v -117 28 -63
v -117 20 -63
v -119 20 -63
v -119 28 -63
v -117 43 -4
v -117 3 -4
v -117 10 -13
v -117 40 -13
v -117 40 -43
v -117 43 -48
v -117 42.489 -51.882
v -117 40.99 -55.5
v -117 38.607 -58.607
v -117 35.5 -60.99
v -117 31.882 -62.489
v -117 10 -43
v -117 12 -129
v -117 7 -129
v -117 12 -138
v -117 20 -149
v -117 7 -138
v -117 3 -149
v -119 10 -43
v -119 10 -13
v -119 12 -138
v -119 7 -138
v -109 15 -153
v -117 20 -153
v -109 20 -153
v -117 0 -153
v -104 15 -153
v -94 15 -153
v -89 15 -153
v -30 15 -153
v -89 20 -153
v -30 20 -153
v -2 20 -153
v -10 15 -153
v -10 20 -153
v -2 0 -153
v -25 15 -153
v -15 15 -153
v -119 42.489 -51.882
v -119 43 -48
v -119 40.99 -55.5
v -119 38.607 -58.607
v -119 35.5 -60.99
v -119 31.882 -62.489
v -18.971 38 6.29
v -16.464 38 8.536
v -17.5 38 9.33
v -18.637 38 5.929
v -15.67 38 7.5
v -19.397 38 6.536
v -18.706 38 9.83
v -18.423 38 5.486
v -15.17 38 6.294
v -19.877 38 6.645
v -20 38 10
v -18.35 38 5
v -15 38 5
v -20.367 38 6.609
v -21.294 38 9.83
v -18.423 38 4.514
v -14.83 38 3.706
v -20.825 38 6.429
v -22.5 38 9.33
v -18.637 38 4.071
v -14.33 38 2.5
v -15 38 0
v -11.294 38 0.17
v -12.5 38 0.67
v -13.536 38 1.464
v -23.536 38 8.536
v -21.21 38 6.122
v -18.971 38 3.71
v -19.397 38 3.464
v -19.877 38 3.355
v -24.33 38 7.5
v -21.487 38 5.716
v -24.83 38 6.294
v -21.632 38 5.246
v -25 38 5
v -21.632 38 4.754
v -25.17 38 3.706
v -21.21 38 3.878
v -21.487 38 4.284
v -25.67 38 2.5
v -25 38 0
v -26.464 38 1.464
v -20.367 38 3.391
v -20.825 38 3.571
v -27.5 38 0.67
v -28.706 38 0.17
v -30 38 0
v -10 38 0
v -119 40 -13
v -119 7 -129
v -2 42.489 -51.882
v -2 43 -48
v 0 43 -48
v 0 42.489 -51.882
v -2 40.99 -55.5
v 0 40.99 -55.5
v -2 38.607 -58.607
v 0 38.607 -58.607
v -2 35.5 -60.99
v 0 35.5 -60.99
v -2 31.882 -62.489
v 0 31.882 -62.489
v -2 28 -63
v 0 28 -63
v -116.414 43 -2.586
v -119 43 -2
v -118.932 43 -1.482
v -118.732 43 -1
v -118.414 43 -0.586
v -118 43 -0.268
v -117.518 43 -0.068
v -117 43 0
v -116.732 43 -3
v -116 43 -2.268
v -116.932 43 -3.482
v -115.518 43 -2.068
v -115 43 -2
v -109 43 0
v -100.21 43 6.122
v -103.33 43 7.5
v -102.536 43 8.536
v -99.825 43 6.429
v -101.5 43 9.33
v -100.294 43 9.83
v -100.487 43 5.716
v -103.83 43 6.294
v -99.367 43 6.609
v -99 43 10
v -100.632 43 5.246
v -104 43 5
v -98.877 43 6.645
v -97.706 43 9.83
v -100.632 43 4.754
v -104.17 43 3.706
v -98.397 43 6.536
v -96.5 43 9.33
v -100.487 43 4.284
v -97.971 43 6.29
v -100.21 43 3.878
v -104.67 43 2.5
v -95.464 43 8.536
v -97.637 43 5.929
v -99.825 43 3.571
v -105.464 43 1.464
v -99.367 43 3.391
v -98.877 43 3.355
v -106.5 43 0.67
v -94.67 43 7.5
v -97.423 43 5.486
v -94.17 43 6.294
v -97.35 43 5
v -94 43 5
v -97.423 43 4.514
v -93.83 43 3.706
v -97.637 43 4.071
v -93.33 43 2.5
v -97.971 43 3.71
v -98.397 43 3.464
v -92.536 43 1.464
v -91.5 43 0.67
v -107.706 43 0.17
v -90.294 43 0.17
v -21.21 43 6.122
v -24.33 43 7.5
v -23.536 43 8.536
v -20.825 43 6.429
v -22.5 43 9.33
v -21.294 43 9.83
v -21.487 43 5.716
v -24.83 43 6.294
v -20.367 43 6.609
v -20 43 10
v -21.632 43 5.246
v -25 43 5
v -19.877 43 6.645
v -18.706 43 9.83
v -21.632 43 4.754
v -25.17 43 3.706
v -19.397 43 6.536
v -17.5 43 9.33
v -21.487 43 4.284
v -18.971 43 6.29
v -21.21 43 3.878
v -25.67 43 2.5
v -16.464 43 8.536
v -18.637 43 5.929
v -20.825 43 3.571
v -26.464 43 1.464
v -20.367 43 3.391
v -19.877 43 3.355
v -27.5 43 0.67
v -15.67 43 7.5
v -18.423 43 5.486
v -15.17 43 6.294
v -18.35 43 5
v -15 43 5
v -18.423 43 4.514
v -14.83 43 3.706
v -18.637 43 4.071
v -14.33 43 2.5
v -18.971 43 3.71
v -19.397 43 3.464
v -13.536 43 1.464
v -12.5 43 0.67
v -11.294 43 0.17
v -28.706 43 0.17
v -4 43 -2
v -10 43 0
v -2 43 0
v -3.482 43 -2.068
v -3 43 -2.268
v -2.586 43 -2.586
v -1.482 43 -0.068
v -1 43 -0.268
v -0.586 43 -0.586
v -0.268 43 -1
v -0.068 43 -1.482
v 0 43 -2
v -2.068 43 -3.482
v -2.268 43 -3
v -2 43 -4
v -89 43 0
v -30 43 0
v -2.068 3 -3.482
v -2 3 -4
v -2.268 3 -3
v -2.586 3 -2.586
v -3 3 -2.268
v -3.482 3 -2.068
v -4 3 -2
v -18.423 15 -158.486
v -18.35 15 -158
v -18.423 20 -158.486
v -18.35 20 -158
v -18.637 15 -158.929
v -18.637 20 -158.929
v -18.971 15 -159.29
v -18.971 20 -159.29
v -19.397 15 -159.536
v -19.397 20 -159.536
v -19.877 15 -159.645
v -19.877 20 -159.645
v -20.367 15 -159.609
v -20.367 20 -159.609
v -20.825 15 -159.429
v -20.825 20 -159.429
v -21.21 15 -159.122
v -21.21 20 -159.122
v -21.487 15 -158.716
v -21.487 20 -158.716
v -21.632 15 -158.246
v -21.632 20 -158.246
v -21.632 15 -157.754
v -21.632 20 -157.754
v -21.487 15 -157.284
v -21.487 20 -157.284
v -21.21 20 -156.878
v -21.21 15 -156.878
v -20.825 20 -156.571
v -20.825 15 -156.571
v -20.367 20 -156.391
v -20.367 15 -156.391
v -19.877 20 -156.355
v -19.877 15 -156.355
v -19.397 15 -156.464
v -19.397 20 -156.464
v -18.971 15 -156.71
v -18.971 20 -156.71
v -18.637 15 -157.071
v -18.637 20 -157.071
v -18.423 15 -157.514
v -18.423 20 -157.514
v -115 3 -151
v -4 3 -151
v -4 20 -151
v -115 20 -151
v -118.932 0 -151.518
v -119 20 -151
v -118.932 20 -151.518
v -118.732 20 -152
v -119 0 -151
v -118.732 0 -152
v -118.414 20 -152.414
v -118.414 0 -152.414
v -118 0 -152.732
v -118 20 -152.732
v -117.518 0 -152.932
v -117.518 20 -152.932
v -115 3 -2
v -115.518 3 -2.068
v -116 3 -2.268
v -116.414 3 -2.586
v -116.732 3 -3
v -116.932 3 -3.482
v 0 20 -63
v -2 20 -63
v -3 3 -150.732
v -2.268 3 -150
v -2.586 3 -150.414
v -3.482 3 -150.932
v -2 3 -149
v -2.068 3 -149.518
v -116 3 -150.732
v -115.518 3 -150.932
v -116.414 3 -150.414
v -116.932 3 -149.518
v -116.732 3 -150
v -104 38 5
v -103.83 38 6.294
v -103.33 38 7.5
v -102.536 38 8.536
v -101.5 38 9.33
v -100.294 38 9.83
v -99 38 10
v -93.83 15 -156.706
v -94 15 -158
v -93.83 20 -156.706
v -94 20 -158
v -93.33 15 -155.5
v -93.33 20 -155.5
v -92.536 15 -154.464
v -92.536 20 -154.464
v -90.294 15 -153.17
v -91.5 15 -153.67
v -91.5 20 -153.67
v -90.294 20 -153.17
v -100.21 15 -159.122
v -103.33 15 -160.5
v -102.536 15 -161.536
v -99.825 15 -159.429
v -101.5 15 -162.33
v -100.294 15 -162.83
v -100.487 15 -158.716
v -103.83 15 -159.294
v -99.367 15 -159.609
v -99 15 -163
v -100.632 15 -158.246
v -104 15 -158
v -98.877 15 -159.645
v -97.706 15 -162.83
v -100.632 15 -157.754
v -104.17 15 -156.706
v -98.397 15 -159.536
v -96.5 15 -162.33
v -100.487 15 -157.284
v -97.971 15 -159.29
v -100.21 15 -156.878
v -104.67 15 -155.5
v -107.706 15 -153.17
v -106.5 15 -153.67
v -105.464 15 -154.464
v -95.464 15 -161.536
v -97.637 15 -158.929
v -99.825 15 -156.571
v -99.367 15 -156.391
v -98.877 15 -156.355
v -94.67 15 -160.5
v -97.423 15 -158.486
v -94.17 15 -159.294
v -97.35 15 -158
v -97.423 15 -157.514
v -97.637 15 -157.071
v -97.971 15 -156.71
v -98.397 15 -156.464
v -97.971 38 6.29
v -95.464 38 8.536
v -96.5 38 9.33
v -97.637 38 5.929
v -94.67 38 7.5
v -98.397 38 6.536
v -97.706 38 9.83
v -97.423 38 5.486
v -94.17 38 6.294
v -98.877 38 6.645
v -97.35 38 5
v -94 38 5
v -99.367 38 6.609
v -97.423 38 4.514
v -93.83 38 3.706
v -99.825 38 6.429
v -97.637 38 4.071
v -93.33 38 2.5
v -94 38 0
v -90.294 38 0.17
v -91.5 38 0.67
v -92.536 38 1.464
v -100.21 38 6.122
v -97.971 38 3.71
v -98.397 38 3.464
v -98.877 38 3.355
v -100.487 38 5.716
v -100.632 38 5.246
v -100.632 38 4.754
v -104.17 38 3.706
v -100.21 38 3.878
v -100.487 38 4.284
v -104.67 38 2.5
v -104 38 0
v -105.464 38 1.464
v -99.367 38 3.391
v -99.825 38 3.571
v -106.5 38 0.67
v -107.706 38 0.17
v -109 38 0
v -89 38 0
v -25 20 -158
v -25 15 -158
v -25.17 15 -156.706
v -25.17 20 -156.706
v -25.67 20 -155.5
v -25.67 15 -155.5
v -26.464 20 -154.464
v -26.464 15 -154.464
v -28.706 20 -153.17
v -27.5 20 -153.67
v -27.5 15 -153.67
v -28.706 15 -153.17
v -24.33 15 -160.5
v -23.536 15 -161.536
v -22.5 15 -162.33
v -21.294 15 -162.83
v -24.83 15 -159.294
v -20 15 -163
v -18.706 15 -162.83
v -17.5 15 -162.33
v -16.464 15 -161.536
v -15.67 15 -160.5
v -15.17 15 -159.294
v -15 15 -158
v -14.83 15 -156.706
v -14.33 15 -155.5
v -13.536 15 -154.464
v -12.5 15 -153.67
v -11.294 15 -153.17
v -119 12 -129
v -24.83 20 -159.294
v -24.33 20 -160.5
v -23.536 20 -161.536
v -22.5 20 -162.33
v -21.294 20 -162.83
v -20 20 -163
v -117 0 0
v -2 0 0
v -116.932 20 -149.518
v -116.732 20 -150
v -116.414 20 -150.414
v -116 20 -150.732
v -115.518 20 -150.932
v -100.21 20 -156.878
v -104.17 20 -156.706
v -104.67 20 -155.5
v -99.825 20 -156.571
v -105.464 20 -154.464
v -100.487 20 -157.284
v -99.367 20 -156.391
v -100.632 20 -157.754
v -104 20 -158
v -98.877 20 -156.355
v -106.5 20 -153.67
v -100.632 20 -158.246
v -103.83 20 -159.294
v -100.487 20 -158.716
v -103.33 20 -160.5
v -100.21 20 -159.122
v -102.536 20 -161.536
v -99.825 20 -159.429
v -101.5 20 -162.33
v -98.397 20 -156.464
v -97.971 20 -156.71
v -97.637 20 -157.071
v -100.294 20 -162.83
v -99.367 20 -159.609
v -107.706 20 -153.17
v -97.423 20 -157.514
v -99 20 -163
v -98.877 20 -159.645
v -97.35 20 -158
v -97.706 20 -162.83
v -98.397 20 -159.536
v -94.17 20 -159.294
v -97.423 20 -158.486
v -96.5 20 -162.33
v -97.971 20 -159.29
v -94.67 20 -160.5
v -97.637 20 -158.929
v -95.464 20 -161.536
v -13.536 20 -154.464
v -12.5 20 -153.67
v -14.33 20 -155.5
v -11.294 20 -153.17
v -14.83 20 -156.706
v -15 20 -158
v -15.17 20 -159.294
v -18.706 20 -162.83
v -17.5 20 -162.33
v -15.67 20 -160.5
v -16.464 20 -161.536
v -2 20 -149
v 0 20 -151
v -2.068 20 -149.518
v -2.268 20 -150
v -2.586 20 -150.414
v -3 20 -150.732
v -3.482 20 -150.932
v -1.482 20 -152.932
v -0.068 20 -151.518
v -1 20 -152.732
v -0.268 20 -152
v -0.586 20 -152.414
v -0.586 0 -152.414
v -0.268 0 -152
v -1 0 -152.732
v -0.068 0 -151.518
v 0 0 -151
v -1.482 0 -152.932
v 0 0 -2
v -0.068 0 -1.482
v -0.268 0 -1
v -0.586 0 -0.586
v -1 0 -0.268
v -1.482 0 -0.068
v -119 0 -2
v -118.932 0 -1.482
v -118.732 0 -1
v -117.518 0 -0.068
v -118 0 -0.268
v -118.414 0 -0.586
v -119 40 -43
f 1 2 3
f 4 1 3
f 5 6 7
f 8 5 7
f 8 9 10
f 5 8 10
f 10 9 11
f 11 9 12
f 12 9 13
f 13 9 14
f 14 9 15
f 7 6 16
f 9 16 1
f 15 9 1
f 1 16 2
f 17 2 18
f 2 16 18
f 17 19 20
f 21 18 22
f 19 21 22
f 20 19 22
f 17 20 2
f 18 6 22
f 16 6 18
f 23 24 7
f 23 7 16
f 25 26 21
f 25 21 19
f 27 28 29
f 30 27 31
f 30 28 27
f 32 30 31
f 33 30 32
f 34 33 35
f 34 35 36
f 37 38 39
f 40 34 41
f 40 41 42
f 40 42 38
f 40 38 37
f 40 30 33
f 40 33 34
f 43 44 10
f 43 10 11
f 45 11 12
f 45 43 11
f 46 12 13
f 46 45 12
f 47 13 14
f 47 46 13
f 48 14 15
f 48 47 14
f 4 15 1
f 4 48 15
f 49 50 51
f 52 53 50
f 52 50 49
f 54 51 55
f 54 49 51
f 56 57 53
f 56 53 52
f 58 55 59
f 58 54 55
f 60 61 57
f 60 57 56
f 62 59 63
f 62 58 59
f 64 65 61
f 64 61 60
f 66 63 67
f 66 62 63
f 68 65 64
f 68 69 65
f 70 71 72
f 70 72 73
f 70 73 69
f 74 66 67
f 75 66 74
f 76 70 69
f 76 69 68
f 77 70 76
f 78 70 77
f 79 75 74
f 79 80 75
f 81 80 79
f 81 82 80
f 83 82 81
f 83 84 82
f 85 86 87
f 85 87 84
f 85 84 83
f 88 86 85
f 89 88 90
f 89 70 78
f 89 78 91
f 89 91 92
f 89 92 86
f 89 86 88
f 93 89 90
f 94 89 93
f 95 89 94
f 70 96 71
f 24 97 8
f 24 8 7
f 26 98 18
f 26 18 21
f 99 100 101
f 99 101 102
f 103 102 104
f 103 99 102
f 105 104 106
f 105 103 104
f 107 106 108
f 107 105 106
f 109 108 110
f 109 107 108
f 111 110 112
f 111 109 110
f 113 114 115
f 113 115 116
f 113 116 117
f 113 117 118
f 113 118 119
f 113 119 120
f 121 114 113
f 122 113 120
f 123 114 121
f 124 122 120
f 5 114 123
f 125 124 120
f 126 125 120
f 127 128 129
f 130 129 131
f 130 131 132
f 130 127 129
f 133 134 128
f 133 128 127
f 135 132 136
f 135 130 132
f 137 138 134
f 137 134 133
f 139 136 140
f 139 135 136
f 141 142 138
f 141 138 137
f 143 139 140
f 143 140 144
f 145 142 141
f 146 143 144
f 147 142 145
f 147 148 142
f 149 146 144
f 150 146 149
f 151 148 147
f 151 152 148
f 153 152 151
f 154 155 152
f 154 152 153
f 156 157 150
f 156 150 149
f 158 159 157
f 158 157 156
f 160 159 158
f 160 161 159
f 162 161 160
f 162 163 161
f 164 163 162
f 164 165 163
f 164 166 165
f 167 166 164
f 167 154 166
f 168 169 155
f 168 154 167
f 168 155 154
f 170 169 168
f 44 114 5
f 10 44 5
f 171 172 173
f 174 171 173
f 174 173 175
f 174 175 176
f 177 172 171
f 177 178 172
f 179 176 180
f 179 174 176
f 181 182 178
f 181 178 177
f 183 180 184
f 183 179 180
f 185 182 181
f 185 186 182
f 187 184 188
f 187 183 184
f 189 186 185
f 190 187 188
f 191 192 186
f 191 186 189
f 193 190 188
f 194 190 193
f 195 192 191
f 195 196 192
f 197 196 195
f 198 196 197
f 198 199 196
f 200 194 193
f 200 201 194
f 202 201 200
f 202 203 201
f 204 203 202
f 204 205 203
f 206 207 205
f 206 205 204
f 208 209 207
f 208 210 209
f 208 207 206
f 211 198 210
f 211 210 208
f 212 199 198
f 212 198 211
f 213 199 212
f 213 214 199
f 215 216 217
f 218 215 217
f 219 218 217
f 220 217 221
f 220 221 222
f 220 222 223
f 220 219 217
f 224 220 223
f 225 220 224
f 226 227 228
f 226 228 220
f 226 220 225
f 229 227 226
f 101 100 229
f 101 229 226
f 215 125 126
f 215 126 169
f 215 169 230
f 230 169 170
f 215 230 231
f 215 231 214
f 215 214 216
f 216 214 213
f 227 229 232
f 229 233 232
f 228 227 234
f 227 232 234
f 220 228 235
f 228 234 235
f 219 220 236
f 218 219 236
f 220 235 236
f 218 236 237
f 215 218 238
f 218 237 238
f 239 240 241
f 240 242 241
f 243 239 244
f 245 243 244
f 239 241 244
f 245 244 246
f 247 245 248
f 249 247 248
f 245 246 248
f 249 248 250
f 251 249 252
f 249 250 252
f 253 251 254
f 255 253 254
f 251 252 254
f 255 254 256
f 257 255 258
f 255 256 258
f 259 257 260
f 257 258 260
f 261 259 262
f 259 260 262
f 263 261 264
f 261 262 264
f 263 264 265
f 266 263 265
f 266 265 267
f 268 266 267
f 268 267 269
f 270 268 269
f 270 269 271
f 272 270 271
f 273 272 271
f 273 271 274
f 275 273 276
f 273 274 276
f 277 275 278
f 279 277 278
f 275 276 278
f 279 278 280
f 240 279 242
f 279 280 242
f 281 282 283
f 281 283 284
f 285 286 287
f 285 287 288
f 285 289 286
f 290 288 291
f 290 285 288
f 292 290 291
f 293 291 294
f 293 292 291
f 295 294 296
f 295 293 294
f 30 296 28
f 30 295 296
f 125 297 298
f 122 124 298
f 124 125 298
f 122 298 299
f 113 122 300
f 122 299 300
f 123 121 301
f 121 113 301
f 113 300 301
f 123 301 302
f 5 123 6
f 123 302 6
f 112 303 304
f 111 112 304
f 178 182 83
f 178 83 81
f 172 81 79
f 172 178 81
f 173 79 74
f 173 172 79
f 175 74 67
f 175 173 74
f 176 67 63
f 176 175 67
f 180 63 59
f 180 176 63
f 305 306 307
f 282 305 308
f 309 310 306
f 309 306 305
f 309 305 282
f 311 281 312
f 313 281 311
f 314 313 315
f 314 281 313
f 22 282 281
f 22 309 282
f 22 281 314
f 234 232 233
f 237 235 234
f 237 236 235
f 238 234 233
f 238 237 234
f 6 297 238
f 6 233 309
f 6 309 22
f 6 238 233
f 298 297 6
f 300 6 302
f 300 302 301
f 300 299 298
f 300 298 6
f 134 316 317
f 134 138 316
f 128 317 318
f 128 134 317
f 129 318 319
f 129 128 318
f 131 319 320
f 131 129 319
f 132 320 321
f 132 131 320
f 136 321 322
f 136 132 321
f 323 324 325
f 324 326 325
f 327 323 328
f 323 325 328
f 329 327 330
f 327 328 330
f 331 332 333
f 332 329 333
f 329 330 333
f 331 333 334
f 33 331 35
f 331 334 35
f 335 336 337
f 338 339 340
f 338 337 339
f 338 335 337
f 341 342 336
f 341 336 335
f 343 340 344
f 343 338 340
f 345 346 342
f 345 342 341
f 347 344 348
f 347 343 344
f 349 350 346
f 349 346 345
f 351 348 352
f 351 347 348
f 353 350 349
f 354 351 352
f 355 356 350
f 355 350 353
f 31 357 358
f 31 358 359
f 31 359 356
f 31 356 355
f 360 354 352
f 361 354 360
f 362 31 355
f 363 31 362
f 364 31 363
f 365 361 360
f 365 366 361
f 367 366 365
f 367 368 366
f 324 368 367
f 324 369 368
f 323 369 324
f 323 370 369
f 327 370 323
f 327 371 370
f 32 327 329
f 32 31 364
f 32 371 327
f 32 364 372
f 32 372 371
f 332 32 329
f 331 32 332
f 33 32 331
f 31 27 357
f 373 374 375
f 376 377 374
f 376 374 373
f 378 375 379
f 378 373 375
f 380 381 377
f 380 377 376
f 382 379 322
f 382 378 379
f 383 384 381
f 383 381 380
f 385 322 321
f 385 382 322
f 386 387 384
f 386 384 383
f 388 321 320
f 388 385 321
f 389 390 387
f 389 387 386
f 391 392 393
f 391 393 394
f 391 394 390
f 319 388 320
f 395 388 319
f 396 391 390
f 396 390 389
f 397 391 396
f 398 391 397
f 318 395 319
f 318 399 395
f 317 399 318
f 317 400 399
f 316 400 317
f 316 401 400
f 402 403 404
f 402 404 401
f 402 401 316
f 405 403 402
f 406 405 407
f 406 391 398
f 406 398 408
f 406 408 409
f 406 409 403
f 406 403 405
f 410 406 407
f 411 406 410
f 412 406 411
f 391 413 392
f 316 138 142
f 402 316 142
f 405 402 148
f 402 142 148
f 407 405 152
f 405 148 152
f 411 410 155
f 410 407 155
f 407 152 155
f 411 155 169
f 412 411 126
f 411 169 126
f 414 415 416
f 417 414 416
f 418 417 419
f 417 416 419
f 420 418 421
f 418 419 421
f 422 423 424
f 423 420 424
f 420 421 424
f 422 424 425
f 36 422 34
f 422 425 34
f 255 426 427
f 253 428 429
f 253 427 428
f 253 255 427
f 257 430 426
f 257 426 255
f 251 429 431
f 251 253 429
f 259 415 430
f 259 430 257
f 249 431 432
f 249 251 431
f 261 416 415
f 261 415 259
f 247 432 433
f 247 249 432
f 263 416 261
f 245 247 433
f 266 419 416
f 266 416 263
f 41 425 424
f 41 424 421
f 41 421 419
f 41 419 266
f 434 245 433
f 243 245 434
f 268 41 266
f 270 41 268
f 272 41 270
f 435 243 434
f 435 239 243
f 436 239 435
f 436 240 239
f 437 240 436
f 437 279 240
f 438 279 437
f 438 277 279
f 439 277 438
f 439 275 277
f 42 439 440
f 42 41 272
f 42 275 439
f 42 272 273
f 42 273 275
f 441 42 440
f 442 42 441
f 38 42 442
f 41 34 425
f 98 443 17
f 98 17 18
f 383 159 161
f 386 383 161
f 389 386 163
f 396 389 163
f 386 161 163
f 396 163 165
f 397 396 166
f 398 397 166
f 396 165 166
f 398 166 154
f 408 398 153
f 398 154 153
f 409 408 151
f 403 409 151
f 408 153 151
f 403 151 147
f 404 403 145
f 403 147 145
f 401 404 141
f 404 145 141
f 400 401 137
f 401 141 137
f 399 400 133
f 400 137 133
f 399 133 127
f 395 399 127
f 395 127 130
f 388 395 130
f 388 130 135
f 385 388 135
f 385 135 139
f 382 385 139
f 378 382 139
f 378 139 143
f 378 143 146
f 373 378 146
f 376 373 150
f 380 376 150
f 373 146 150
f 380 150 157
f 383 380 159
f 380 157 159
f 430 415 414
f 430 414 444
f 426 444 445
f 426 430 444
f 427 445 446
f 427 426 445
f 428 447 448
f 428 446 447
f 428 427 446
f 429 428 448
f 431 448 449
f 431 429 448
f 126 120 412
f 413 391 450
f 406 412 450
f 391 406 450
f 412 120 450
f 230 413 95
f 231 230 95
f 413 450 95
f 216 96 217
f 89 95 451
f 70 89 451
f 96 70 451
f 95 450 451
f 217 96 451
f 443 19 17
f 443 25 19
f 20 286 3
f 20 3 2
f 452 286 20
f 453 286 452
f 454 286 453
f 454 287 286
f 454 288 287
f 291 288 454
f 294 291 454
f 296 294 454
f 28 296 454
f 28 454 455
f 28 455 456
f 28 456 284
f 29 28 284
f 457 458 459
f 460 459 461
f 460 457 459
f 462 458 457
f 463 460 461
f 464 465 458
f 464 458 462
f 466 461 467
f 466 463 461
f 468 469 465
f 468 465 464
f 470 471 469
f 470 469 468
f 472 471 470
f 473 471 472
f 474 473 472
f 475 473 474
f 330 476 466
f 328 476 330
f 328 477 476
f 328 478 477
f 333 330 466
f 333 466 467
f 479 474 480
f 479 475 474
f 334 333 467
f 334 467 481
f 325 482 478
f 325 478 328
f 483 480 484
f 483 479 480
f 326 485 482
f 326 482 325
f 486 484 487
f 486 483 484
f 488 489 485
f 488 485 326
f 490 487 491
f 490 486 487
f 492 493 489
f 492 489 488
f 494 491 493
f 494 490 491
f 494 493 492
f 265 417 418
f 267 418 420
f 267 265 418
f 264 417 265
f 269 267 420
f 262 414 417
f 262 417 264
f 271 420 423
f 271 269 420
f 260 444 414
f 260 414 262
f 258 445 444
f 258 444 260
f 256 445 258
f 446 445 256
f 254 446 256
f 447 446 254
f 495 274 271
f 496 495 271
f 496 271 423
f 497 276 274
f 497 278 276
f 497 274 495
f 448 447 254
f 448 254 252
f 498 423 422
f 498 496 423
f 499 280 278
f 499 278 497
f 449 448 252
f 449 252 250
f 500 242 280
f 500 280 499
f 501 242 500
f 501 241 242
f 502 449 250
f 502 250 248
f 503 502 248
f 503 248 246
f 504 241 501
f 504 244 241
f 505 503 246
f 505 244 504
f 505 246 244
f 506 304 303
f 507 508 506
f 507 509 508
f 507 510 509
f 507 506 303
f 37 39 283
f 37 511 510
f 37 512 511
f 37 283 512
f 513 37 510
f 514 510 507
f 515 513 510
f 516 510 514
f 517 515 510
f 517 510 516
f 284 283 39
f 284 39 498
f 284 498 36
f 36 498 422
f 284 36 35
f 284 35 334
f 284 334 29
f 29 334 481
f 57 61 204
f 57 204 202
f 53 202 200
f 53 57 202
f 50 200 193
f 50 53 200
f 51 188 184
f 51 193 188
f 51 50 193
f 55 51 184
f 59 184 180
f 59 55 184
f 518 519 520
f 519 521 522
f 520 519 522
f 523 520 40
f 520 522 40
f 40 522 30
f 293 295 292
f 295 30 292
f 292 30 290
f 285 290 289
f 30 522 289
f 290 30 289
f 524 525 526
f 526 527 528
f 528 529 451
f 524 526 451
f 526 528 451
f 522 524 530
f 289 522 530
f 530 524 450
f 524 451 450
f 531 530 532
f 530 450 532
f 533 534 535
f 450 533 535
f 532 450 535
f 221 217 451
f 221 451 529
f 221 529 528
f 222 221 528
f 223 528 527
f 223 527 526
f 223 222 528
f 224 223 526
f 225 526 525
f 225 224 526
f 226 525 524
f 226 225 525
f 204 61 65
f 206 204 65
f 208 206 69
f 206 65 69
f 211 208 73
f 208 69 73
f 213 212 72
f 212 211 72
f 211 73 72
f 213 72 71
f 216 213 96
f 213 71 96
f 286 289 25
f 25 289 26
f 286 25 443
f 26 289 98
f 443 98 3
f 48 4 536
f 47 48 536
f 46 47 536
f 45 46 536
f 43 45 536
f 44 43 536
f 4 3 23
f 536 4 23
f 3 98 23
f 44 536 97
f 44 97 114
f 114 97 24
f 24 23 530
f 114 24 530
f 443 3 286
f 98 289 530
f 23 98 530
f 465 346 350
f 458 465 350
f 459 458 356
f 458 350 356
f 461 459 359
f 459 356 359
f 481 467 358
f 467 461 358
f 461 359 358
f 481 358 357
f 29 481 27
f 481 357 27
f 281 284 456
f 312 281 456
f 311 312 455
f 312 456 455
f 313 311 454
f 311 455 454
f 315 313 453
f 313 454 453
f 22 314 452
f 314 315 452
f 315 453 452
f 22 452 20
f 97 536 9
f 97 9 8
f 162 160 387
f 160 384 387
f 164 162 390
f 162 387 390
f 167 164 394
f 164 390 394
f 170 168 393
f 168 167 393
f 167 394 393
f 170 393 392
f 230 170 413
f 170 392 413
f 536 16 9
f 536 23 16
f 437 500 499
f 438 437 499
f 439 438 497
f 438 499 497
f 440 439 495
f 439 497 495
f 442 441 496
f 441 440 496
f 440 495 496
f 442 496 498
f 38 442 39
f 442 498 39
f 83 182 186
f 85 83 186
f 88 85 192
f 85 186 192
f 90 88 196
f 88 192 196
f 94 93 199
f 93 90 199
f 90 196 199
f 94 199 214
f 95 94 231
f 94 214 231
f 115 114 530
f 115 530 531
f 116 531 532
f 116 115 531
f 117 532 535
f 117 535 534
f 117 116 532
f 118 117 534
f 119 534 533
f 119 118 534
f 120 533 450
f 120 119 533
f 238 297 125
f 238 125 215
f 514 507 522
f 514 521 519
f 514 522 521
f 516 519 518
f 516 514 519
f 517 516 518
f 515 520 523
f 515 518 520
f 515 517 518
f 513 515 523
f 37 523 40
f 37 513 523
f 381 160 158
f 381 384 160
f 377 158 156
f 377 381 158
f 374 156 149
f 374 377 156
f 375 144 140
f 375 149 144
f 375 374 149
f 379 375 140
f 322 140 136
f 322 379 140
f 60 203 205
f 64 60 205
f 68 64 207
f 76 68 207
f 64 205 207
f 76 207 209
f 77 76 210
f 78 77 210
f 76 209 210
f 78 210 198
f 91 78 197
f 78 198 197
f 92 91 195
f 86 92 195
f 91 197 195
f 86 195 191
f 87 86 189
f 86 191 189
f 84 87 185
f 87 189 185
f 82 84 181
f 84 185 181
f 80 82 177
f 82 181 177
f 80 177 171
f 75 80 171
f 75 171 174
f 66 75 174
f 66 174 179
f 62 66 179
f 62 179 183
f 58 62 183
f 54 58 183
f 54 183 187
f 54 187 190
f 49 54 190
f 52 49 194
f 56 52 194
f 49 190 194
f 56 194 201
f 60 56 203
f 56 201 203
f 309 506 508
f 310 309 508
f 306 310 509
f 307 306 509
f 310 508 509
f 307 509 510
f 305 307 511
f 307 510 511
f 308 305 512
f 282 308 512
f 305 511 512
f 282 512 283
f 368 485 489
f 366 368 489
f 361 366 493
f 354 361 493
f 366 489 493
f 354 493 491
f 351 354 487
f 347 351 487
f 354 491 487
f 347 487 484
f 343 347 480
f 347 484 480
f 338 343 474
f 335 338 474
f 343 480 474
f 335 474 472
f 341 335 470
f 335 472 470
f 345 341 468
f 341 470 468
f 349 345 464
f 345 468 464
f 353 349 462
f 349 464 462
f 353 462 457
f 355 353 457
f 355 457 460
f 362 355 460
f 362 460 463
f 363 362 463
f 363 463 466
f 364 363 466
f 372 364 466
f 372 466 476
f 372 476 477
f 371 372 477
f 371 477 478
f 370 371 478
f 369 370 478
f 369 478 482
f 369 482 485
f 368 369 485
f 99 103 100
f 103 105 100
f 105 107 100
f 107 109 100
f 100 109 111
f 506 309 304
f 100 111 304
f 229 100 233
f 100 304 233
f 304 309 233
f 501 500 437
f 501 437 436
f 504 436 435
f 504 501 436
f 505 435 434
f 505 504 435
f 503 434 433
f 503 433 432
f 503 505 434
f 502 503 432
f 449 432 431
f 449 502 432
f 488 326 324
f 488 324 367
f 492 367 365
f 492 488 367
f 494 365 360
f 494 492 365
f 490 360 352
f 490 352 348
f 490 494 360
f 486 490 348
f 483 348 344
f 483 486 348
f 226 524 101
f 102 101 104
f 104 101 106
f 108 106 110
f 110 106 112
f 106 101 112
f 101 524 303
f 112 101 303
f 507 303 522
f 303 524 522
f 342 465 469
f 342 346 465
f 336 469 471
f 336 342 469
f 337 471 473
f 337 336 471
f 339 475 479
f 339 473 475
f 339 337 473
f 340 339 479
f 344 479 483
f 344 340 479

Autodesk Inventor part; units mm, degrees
ref_plane "YZ Plane" through (0, 0, 0) normal (1, 0, 0) x (0, 1, 0)
ref_plane "XZ Plane" through (0, 0, 0) normal (0, 1, 0) x (-1, 0, 0)
ref_plane "XY Plane" through (0, 0, 0) normal (0, 0, 1) x (1, 0, 0)
sketch "Sketch2" plane through (0, 0, 0) normal (0, 1, 0) x (-1, 0, 0)
  line L0 (0, 0) -> (119, 0)
  line L1 (119, 0) -> (119, -153)
  line L2 (119, -153) -> (0, -153)
  line L3 (0, -153) -> (0, 0)
  dimension "d0" = 119
  dimension "d1" = 153
extrude "Extrusion1" add sketch "Sketch2" along normal blind 3
sketch "Sketch7" plane through (0, 3, 0) normal (0, 1, 0) x (1, 0, 0)
  line L0 (-117, 2) -> (-2, 2)
  line L1 (-2, 2) -> (-2, 151)
  line L2 (-2, 151) -> (-117, 151)
  line L3 (-117, 151) -> (-117, 2)
  line L4 (-119, 153) -> (-119, 0) projected
  line L5 (-119, 0) -> (0, 0) projected
  line L6 (0, 153) -> (-119, 153) projected
  line L7 (-119, 0) -> (0, 0)
  line L8 (0, 0) -> (0, 153)
  line L9 (0, 153) -> (-119, 153)
  line L10 (-119, 153) -> (-119, 0)
  dimension "d27" = 115
  dimension "d28" = 149
  dimension "d29" = 2
  dimension "d30" = 2
extrude "Extrusion5" add sketch "Sketch7" along normal blind 17
sketch "Sketch8" plane through (0, 20, 0) normal (0, 1, 0) x (1, 0, 0)
  line L0 (-119, 0) -> (0, 0) projected
  line L1 (-119, 0) -> (0, 0)
  line L2 (0, 0) -> (0, 63)
  line L3 (-119, 63) -> (-119, 0)
  line L4 (-117, 2) -> (-117, 151) projected
  line L5 (-2, 151) -> (-2, 2) projected
  line L6 (-117, 2) -> (-2, 2)
  line L7 (-2, 2) -> (-2, 63)
  line L8 (-2, 63) -> (-117, 63)
  line L9 (-117, 63) -> (-117, 2)
  line L10 (0, 63) -> (-2, 63)
  line L11 (-117, 63) -> (-119, 63)
  dimension "d33" = 119
  dimension "d34" = 63
extrude "Extrusion6" add sketch "Sketch8" along normal blind 23 contours L3 L11 L4 L6 L5 L10 L2 L0
sketch "Sketch9" plane through (-119, 0, -153) normal (-1, 0, 0) x (0, 0, 1)
  line L0 (15, 12) -> (24, 12)
  line L1 (24, 12) -> (24, 7)
  line L2 (24, 7) -> (15, 7)
  line L3 (15, 7) -> (15, 12)
  line L4 (2, 3) -> (151, 3) projected
  line L5 (0, 0) -> (0, 20) projected
  line L6 (2, 3) -> (2, 20) projected
  line L7 (110, 40) -> (140, 40)
  line L8 (140, 40) -> (140, 10)
  line L9 (140, 10) -> (110, 10)
  line L10 (110, 10) -> (110, 40)
  line L11 (0, 0) -> (153, 0) projected
  line L12 (90, 20) -> (90, 43) projected
  dimension "d37" = 9
  dimension "d38" = 5
  dimension "d39" = 4
  dimension "d40" = 15
  dimension "d41" = 13
  dimension "d42" = 30
  dimension "d43" = 30
  dimension "d44" = 10
  dimension "d45" = 20
extrude "Extrusion7" cut sketch "Sketch9" against normal blind 23
fillet "Fillet1" radius 2 8 edges at (-119, 10, -153) (-117, 11.5, -151) (0, 21.5, 0) (0, 10, -153) (-119, 21.5, 0) (-2, 23, -2) (-2, 11.5, -151) (-117, 23, -2)
fillet "Fillet2" radius 15 2 edges at (-118, 43, -63) (-1, 43, -63)
sketch "Sketch10" plane through (-117, 0, 0) normal (0, 0, 1) x (1, 0, 0)
  line L0 (113, 43) -> (2, 43) projected
  line L1 (13, 43) -> (23, 43)
  line L2 (23, 43) -> (23, 38)
  line L3 (23, 38) -> (13, 38)
  line L4 (13, 38) -> (13, 43)
  line L5 (92, 43) -> (102, 43)
  line L6 (102, 43) -> (102, 38)
  line L7 (102, 38) -> (92, 38)
  line L8 (92, 38) -> (92, 43)
  line L9 (117, 0) -> (117, 43) projected
  line L10 (-2, 43) -> (-2, 0) projected
  point P0 (23, 43)
  dimension "d50" = 10
  dimension "d51" = 5
  dimension "d52" = 10
  dimension "d53" = 5
  dimension "d54" = 119
  dimension "d55" = 15
  dimension "d56" = 15
extrude "Extrusion8" add sketch "Sketch10" along normal blind 10
sketch "Sketch11" plane through (-2, 0, -153) normal (0, 0, -1) x (-1, 0, 0)
  line L0 (113, 20) -> (2, 20) projected
  line L1 (13, 20) -> (23, 20)
  line L2 (23, 20) -> (23, 15)
  line L3 (23, 15) -> (13, 15)
  line L4 (13, 15) -> (13, 20)
  line L5 (92, 20) -> (102, 20)
  line L6 (102, 20) -> (102, 15)
  line L7 (102, 15) -> (92, 15)
  line L8 (92, 15) -> (92, 20)
  line L9 (-2, 20) -> (-2, 0) projected
  line L10 (117, 0) -> (117, 20) projected
  dimension "d59" = 10
  dimension "d60" = 5
  dimension "d61" = 10
  dimension "d62" = 5
  dimension "d63" = 15
  dimension "d64" = 15
extrude "Extrusion9" add sketch "Sketch11" along normal blind 10
sketch "Sketch12" plane through (0, 43, 0) normal (0, 1, 0) x (1, 0, 0)
  circle A0 centre (-99, -5) radius 1.65
  line L0 (-94, -10) -> (-104, -10) projected
  circle A1 centre (-20, -5) radius 1.65
  line L1 (-15, -10) -> (-25, -10) projected
  line L2 (-104, 0) -> (-104, -10) projected
  line L3 (-15, 0) -> (-15, -10) projected
  point P0 (0, 0)
  dimension "d67" = 3.3
  dimension "d68" = 5
  dimension "d69" = 3.3
  dimension "d70" = 5
  dimension "d71" = 5
  dimension "d72" = 5
extrude "Extrusion10" cut sketch "Sketch12" against normal blind 10
sketch "Sketch13" plane through (0, 20, 0) normal (0, 1, 0) x (1, 0, 0)
  circle A0 centre (-99, 158) radius 1.65
  line L0 (-104, 153) -> (-104, 163) projected
  line L1 (-104, 163) -> (-94, 163) projected
  circle A1 centre (-20, 158) radius 1.65
  line L2 (-25, 153) -> (-25, 163) projected
  line L3 (-25, 163) -> (-15, 163) projected
  point P0 (0, 0)
  point P1 (-25, 158)
  dimension "d75" = 3.3
  dimension "d76" = 5
  dimension "d77" = 5
  dimension "d78" = 3.3
  dimension "d79" = 5
  dimension "d80" = 5
extrude "Extrusion11" cut sketch "Sketch13" against normal blind 10
fillet "Fillet3" radius 5 16 edges at (-15, 17.5, -163) (-25, 17.5, -163) (-15, 17.5, -153) (-94, 17.5, -163) (-94, 17.5, -153) (-25, 17.5, -153) (-104, 17.5, -163) (-104, 17.5, -153) (-104, 40.5, 0) (-104, 40.5, 10) (-94, 40.5, 10) (-94, 40.5, 0) (-25, 40.5, 10) (-15, 40.5, 10) (-15, 40.5, 0) (-25, 40.5, 0)
properties part number "base"
